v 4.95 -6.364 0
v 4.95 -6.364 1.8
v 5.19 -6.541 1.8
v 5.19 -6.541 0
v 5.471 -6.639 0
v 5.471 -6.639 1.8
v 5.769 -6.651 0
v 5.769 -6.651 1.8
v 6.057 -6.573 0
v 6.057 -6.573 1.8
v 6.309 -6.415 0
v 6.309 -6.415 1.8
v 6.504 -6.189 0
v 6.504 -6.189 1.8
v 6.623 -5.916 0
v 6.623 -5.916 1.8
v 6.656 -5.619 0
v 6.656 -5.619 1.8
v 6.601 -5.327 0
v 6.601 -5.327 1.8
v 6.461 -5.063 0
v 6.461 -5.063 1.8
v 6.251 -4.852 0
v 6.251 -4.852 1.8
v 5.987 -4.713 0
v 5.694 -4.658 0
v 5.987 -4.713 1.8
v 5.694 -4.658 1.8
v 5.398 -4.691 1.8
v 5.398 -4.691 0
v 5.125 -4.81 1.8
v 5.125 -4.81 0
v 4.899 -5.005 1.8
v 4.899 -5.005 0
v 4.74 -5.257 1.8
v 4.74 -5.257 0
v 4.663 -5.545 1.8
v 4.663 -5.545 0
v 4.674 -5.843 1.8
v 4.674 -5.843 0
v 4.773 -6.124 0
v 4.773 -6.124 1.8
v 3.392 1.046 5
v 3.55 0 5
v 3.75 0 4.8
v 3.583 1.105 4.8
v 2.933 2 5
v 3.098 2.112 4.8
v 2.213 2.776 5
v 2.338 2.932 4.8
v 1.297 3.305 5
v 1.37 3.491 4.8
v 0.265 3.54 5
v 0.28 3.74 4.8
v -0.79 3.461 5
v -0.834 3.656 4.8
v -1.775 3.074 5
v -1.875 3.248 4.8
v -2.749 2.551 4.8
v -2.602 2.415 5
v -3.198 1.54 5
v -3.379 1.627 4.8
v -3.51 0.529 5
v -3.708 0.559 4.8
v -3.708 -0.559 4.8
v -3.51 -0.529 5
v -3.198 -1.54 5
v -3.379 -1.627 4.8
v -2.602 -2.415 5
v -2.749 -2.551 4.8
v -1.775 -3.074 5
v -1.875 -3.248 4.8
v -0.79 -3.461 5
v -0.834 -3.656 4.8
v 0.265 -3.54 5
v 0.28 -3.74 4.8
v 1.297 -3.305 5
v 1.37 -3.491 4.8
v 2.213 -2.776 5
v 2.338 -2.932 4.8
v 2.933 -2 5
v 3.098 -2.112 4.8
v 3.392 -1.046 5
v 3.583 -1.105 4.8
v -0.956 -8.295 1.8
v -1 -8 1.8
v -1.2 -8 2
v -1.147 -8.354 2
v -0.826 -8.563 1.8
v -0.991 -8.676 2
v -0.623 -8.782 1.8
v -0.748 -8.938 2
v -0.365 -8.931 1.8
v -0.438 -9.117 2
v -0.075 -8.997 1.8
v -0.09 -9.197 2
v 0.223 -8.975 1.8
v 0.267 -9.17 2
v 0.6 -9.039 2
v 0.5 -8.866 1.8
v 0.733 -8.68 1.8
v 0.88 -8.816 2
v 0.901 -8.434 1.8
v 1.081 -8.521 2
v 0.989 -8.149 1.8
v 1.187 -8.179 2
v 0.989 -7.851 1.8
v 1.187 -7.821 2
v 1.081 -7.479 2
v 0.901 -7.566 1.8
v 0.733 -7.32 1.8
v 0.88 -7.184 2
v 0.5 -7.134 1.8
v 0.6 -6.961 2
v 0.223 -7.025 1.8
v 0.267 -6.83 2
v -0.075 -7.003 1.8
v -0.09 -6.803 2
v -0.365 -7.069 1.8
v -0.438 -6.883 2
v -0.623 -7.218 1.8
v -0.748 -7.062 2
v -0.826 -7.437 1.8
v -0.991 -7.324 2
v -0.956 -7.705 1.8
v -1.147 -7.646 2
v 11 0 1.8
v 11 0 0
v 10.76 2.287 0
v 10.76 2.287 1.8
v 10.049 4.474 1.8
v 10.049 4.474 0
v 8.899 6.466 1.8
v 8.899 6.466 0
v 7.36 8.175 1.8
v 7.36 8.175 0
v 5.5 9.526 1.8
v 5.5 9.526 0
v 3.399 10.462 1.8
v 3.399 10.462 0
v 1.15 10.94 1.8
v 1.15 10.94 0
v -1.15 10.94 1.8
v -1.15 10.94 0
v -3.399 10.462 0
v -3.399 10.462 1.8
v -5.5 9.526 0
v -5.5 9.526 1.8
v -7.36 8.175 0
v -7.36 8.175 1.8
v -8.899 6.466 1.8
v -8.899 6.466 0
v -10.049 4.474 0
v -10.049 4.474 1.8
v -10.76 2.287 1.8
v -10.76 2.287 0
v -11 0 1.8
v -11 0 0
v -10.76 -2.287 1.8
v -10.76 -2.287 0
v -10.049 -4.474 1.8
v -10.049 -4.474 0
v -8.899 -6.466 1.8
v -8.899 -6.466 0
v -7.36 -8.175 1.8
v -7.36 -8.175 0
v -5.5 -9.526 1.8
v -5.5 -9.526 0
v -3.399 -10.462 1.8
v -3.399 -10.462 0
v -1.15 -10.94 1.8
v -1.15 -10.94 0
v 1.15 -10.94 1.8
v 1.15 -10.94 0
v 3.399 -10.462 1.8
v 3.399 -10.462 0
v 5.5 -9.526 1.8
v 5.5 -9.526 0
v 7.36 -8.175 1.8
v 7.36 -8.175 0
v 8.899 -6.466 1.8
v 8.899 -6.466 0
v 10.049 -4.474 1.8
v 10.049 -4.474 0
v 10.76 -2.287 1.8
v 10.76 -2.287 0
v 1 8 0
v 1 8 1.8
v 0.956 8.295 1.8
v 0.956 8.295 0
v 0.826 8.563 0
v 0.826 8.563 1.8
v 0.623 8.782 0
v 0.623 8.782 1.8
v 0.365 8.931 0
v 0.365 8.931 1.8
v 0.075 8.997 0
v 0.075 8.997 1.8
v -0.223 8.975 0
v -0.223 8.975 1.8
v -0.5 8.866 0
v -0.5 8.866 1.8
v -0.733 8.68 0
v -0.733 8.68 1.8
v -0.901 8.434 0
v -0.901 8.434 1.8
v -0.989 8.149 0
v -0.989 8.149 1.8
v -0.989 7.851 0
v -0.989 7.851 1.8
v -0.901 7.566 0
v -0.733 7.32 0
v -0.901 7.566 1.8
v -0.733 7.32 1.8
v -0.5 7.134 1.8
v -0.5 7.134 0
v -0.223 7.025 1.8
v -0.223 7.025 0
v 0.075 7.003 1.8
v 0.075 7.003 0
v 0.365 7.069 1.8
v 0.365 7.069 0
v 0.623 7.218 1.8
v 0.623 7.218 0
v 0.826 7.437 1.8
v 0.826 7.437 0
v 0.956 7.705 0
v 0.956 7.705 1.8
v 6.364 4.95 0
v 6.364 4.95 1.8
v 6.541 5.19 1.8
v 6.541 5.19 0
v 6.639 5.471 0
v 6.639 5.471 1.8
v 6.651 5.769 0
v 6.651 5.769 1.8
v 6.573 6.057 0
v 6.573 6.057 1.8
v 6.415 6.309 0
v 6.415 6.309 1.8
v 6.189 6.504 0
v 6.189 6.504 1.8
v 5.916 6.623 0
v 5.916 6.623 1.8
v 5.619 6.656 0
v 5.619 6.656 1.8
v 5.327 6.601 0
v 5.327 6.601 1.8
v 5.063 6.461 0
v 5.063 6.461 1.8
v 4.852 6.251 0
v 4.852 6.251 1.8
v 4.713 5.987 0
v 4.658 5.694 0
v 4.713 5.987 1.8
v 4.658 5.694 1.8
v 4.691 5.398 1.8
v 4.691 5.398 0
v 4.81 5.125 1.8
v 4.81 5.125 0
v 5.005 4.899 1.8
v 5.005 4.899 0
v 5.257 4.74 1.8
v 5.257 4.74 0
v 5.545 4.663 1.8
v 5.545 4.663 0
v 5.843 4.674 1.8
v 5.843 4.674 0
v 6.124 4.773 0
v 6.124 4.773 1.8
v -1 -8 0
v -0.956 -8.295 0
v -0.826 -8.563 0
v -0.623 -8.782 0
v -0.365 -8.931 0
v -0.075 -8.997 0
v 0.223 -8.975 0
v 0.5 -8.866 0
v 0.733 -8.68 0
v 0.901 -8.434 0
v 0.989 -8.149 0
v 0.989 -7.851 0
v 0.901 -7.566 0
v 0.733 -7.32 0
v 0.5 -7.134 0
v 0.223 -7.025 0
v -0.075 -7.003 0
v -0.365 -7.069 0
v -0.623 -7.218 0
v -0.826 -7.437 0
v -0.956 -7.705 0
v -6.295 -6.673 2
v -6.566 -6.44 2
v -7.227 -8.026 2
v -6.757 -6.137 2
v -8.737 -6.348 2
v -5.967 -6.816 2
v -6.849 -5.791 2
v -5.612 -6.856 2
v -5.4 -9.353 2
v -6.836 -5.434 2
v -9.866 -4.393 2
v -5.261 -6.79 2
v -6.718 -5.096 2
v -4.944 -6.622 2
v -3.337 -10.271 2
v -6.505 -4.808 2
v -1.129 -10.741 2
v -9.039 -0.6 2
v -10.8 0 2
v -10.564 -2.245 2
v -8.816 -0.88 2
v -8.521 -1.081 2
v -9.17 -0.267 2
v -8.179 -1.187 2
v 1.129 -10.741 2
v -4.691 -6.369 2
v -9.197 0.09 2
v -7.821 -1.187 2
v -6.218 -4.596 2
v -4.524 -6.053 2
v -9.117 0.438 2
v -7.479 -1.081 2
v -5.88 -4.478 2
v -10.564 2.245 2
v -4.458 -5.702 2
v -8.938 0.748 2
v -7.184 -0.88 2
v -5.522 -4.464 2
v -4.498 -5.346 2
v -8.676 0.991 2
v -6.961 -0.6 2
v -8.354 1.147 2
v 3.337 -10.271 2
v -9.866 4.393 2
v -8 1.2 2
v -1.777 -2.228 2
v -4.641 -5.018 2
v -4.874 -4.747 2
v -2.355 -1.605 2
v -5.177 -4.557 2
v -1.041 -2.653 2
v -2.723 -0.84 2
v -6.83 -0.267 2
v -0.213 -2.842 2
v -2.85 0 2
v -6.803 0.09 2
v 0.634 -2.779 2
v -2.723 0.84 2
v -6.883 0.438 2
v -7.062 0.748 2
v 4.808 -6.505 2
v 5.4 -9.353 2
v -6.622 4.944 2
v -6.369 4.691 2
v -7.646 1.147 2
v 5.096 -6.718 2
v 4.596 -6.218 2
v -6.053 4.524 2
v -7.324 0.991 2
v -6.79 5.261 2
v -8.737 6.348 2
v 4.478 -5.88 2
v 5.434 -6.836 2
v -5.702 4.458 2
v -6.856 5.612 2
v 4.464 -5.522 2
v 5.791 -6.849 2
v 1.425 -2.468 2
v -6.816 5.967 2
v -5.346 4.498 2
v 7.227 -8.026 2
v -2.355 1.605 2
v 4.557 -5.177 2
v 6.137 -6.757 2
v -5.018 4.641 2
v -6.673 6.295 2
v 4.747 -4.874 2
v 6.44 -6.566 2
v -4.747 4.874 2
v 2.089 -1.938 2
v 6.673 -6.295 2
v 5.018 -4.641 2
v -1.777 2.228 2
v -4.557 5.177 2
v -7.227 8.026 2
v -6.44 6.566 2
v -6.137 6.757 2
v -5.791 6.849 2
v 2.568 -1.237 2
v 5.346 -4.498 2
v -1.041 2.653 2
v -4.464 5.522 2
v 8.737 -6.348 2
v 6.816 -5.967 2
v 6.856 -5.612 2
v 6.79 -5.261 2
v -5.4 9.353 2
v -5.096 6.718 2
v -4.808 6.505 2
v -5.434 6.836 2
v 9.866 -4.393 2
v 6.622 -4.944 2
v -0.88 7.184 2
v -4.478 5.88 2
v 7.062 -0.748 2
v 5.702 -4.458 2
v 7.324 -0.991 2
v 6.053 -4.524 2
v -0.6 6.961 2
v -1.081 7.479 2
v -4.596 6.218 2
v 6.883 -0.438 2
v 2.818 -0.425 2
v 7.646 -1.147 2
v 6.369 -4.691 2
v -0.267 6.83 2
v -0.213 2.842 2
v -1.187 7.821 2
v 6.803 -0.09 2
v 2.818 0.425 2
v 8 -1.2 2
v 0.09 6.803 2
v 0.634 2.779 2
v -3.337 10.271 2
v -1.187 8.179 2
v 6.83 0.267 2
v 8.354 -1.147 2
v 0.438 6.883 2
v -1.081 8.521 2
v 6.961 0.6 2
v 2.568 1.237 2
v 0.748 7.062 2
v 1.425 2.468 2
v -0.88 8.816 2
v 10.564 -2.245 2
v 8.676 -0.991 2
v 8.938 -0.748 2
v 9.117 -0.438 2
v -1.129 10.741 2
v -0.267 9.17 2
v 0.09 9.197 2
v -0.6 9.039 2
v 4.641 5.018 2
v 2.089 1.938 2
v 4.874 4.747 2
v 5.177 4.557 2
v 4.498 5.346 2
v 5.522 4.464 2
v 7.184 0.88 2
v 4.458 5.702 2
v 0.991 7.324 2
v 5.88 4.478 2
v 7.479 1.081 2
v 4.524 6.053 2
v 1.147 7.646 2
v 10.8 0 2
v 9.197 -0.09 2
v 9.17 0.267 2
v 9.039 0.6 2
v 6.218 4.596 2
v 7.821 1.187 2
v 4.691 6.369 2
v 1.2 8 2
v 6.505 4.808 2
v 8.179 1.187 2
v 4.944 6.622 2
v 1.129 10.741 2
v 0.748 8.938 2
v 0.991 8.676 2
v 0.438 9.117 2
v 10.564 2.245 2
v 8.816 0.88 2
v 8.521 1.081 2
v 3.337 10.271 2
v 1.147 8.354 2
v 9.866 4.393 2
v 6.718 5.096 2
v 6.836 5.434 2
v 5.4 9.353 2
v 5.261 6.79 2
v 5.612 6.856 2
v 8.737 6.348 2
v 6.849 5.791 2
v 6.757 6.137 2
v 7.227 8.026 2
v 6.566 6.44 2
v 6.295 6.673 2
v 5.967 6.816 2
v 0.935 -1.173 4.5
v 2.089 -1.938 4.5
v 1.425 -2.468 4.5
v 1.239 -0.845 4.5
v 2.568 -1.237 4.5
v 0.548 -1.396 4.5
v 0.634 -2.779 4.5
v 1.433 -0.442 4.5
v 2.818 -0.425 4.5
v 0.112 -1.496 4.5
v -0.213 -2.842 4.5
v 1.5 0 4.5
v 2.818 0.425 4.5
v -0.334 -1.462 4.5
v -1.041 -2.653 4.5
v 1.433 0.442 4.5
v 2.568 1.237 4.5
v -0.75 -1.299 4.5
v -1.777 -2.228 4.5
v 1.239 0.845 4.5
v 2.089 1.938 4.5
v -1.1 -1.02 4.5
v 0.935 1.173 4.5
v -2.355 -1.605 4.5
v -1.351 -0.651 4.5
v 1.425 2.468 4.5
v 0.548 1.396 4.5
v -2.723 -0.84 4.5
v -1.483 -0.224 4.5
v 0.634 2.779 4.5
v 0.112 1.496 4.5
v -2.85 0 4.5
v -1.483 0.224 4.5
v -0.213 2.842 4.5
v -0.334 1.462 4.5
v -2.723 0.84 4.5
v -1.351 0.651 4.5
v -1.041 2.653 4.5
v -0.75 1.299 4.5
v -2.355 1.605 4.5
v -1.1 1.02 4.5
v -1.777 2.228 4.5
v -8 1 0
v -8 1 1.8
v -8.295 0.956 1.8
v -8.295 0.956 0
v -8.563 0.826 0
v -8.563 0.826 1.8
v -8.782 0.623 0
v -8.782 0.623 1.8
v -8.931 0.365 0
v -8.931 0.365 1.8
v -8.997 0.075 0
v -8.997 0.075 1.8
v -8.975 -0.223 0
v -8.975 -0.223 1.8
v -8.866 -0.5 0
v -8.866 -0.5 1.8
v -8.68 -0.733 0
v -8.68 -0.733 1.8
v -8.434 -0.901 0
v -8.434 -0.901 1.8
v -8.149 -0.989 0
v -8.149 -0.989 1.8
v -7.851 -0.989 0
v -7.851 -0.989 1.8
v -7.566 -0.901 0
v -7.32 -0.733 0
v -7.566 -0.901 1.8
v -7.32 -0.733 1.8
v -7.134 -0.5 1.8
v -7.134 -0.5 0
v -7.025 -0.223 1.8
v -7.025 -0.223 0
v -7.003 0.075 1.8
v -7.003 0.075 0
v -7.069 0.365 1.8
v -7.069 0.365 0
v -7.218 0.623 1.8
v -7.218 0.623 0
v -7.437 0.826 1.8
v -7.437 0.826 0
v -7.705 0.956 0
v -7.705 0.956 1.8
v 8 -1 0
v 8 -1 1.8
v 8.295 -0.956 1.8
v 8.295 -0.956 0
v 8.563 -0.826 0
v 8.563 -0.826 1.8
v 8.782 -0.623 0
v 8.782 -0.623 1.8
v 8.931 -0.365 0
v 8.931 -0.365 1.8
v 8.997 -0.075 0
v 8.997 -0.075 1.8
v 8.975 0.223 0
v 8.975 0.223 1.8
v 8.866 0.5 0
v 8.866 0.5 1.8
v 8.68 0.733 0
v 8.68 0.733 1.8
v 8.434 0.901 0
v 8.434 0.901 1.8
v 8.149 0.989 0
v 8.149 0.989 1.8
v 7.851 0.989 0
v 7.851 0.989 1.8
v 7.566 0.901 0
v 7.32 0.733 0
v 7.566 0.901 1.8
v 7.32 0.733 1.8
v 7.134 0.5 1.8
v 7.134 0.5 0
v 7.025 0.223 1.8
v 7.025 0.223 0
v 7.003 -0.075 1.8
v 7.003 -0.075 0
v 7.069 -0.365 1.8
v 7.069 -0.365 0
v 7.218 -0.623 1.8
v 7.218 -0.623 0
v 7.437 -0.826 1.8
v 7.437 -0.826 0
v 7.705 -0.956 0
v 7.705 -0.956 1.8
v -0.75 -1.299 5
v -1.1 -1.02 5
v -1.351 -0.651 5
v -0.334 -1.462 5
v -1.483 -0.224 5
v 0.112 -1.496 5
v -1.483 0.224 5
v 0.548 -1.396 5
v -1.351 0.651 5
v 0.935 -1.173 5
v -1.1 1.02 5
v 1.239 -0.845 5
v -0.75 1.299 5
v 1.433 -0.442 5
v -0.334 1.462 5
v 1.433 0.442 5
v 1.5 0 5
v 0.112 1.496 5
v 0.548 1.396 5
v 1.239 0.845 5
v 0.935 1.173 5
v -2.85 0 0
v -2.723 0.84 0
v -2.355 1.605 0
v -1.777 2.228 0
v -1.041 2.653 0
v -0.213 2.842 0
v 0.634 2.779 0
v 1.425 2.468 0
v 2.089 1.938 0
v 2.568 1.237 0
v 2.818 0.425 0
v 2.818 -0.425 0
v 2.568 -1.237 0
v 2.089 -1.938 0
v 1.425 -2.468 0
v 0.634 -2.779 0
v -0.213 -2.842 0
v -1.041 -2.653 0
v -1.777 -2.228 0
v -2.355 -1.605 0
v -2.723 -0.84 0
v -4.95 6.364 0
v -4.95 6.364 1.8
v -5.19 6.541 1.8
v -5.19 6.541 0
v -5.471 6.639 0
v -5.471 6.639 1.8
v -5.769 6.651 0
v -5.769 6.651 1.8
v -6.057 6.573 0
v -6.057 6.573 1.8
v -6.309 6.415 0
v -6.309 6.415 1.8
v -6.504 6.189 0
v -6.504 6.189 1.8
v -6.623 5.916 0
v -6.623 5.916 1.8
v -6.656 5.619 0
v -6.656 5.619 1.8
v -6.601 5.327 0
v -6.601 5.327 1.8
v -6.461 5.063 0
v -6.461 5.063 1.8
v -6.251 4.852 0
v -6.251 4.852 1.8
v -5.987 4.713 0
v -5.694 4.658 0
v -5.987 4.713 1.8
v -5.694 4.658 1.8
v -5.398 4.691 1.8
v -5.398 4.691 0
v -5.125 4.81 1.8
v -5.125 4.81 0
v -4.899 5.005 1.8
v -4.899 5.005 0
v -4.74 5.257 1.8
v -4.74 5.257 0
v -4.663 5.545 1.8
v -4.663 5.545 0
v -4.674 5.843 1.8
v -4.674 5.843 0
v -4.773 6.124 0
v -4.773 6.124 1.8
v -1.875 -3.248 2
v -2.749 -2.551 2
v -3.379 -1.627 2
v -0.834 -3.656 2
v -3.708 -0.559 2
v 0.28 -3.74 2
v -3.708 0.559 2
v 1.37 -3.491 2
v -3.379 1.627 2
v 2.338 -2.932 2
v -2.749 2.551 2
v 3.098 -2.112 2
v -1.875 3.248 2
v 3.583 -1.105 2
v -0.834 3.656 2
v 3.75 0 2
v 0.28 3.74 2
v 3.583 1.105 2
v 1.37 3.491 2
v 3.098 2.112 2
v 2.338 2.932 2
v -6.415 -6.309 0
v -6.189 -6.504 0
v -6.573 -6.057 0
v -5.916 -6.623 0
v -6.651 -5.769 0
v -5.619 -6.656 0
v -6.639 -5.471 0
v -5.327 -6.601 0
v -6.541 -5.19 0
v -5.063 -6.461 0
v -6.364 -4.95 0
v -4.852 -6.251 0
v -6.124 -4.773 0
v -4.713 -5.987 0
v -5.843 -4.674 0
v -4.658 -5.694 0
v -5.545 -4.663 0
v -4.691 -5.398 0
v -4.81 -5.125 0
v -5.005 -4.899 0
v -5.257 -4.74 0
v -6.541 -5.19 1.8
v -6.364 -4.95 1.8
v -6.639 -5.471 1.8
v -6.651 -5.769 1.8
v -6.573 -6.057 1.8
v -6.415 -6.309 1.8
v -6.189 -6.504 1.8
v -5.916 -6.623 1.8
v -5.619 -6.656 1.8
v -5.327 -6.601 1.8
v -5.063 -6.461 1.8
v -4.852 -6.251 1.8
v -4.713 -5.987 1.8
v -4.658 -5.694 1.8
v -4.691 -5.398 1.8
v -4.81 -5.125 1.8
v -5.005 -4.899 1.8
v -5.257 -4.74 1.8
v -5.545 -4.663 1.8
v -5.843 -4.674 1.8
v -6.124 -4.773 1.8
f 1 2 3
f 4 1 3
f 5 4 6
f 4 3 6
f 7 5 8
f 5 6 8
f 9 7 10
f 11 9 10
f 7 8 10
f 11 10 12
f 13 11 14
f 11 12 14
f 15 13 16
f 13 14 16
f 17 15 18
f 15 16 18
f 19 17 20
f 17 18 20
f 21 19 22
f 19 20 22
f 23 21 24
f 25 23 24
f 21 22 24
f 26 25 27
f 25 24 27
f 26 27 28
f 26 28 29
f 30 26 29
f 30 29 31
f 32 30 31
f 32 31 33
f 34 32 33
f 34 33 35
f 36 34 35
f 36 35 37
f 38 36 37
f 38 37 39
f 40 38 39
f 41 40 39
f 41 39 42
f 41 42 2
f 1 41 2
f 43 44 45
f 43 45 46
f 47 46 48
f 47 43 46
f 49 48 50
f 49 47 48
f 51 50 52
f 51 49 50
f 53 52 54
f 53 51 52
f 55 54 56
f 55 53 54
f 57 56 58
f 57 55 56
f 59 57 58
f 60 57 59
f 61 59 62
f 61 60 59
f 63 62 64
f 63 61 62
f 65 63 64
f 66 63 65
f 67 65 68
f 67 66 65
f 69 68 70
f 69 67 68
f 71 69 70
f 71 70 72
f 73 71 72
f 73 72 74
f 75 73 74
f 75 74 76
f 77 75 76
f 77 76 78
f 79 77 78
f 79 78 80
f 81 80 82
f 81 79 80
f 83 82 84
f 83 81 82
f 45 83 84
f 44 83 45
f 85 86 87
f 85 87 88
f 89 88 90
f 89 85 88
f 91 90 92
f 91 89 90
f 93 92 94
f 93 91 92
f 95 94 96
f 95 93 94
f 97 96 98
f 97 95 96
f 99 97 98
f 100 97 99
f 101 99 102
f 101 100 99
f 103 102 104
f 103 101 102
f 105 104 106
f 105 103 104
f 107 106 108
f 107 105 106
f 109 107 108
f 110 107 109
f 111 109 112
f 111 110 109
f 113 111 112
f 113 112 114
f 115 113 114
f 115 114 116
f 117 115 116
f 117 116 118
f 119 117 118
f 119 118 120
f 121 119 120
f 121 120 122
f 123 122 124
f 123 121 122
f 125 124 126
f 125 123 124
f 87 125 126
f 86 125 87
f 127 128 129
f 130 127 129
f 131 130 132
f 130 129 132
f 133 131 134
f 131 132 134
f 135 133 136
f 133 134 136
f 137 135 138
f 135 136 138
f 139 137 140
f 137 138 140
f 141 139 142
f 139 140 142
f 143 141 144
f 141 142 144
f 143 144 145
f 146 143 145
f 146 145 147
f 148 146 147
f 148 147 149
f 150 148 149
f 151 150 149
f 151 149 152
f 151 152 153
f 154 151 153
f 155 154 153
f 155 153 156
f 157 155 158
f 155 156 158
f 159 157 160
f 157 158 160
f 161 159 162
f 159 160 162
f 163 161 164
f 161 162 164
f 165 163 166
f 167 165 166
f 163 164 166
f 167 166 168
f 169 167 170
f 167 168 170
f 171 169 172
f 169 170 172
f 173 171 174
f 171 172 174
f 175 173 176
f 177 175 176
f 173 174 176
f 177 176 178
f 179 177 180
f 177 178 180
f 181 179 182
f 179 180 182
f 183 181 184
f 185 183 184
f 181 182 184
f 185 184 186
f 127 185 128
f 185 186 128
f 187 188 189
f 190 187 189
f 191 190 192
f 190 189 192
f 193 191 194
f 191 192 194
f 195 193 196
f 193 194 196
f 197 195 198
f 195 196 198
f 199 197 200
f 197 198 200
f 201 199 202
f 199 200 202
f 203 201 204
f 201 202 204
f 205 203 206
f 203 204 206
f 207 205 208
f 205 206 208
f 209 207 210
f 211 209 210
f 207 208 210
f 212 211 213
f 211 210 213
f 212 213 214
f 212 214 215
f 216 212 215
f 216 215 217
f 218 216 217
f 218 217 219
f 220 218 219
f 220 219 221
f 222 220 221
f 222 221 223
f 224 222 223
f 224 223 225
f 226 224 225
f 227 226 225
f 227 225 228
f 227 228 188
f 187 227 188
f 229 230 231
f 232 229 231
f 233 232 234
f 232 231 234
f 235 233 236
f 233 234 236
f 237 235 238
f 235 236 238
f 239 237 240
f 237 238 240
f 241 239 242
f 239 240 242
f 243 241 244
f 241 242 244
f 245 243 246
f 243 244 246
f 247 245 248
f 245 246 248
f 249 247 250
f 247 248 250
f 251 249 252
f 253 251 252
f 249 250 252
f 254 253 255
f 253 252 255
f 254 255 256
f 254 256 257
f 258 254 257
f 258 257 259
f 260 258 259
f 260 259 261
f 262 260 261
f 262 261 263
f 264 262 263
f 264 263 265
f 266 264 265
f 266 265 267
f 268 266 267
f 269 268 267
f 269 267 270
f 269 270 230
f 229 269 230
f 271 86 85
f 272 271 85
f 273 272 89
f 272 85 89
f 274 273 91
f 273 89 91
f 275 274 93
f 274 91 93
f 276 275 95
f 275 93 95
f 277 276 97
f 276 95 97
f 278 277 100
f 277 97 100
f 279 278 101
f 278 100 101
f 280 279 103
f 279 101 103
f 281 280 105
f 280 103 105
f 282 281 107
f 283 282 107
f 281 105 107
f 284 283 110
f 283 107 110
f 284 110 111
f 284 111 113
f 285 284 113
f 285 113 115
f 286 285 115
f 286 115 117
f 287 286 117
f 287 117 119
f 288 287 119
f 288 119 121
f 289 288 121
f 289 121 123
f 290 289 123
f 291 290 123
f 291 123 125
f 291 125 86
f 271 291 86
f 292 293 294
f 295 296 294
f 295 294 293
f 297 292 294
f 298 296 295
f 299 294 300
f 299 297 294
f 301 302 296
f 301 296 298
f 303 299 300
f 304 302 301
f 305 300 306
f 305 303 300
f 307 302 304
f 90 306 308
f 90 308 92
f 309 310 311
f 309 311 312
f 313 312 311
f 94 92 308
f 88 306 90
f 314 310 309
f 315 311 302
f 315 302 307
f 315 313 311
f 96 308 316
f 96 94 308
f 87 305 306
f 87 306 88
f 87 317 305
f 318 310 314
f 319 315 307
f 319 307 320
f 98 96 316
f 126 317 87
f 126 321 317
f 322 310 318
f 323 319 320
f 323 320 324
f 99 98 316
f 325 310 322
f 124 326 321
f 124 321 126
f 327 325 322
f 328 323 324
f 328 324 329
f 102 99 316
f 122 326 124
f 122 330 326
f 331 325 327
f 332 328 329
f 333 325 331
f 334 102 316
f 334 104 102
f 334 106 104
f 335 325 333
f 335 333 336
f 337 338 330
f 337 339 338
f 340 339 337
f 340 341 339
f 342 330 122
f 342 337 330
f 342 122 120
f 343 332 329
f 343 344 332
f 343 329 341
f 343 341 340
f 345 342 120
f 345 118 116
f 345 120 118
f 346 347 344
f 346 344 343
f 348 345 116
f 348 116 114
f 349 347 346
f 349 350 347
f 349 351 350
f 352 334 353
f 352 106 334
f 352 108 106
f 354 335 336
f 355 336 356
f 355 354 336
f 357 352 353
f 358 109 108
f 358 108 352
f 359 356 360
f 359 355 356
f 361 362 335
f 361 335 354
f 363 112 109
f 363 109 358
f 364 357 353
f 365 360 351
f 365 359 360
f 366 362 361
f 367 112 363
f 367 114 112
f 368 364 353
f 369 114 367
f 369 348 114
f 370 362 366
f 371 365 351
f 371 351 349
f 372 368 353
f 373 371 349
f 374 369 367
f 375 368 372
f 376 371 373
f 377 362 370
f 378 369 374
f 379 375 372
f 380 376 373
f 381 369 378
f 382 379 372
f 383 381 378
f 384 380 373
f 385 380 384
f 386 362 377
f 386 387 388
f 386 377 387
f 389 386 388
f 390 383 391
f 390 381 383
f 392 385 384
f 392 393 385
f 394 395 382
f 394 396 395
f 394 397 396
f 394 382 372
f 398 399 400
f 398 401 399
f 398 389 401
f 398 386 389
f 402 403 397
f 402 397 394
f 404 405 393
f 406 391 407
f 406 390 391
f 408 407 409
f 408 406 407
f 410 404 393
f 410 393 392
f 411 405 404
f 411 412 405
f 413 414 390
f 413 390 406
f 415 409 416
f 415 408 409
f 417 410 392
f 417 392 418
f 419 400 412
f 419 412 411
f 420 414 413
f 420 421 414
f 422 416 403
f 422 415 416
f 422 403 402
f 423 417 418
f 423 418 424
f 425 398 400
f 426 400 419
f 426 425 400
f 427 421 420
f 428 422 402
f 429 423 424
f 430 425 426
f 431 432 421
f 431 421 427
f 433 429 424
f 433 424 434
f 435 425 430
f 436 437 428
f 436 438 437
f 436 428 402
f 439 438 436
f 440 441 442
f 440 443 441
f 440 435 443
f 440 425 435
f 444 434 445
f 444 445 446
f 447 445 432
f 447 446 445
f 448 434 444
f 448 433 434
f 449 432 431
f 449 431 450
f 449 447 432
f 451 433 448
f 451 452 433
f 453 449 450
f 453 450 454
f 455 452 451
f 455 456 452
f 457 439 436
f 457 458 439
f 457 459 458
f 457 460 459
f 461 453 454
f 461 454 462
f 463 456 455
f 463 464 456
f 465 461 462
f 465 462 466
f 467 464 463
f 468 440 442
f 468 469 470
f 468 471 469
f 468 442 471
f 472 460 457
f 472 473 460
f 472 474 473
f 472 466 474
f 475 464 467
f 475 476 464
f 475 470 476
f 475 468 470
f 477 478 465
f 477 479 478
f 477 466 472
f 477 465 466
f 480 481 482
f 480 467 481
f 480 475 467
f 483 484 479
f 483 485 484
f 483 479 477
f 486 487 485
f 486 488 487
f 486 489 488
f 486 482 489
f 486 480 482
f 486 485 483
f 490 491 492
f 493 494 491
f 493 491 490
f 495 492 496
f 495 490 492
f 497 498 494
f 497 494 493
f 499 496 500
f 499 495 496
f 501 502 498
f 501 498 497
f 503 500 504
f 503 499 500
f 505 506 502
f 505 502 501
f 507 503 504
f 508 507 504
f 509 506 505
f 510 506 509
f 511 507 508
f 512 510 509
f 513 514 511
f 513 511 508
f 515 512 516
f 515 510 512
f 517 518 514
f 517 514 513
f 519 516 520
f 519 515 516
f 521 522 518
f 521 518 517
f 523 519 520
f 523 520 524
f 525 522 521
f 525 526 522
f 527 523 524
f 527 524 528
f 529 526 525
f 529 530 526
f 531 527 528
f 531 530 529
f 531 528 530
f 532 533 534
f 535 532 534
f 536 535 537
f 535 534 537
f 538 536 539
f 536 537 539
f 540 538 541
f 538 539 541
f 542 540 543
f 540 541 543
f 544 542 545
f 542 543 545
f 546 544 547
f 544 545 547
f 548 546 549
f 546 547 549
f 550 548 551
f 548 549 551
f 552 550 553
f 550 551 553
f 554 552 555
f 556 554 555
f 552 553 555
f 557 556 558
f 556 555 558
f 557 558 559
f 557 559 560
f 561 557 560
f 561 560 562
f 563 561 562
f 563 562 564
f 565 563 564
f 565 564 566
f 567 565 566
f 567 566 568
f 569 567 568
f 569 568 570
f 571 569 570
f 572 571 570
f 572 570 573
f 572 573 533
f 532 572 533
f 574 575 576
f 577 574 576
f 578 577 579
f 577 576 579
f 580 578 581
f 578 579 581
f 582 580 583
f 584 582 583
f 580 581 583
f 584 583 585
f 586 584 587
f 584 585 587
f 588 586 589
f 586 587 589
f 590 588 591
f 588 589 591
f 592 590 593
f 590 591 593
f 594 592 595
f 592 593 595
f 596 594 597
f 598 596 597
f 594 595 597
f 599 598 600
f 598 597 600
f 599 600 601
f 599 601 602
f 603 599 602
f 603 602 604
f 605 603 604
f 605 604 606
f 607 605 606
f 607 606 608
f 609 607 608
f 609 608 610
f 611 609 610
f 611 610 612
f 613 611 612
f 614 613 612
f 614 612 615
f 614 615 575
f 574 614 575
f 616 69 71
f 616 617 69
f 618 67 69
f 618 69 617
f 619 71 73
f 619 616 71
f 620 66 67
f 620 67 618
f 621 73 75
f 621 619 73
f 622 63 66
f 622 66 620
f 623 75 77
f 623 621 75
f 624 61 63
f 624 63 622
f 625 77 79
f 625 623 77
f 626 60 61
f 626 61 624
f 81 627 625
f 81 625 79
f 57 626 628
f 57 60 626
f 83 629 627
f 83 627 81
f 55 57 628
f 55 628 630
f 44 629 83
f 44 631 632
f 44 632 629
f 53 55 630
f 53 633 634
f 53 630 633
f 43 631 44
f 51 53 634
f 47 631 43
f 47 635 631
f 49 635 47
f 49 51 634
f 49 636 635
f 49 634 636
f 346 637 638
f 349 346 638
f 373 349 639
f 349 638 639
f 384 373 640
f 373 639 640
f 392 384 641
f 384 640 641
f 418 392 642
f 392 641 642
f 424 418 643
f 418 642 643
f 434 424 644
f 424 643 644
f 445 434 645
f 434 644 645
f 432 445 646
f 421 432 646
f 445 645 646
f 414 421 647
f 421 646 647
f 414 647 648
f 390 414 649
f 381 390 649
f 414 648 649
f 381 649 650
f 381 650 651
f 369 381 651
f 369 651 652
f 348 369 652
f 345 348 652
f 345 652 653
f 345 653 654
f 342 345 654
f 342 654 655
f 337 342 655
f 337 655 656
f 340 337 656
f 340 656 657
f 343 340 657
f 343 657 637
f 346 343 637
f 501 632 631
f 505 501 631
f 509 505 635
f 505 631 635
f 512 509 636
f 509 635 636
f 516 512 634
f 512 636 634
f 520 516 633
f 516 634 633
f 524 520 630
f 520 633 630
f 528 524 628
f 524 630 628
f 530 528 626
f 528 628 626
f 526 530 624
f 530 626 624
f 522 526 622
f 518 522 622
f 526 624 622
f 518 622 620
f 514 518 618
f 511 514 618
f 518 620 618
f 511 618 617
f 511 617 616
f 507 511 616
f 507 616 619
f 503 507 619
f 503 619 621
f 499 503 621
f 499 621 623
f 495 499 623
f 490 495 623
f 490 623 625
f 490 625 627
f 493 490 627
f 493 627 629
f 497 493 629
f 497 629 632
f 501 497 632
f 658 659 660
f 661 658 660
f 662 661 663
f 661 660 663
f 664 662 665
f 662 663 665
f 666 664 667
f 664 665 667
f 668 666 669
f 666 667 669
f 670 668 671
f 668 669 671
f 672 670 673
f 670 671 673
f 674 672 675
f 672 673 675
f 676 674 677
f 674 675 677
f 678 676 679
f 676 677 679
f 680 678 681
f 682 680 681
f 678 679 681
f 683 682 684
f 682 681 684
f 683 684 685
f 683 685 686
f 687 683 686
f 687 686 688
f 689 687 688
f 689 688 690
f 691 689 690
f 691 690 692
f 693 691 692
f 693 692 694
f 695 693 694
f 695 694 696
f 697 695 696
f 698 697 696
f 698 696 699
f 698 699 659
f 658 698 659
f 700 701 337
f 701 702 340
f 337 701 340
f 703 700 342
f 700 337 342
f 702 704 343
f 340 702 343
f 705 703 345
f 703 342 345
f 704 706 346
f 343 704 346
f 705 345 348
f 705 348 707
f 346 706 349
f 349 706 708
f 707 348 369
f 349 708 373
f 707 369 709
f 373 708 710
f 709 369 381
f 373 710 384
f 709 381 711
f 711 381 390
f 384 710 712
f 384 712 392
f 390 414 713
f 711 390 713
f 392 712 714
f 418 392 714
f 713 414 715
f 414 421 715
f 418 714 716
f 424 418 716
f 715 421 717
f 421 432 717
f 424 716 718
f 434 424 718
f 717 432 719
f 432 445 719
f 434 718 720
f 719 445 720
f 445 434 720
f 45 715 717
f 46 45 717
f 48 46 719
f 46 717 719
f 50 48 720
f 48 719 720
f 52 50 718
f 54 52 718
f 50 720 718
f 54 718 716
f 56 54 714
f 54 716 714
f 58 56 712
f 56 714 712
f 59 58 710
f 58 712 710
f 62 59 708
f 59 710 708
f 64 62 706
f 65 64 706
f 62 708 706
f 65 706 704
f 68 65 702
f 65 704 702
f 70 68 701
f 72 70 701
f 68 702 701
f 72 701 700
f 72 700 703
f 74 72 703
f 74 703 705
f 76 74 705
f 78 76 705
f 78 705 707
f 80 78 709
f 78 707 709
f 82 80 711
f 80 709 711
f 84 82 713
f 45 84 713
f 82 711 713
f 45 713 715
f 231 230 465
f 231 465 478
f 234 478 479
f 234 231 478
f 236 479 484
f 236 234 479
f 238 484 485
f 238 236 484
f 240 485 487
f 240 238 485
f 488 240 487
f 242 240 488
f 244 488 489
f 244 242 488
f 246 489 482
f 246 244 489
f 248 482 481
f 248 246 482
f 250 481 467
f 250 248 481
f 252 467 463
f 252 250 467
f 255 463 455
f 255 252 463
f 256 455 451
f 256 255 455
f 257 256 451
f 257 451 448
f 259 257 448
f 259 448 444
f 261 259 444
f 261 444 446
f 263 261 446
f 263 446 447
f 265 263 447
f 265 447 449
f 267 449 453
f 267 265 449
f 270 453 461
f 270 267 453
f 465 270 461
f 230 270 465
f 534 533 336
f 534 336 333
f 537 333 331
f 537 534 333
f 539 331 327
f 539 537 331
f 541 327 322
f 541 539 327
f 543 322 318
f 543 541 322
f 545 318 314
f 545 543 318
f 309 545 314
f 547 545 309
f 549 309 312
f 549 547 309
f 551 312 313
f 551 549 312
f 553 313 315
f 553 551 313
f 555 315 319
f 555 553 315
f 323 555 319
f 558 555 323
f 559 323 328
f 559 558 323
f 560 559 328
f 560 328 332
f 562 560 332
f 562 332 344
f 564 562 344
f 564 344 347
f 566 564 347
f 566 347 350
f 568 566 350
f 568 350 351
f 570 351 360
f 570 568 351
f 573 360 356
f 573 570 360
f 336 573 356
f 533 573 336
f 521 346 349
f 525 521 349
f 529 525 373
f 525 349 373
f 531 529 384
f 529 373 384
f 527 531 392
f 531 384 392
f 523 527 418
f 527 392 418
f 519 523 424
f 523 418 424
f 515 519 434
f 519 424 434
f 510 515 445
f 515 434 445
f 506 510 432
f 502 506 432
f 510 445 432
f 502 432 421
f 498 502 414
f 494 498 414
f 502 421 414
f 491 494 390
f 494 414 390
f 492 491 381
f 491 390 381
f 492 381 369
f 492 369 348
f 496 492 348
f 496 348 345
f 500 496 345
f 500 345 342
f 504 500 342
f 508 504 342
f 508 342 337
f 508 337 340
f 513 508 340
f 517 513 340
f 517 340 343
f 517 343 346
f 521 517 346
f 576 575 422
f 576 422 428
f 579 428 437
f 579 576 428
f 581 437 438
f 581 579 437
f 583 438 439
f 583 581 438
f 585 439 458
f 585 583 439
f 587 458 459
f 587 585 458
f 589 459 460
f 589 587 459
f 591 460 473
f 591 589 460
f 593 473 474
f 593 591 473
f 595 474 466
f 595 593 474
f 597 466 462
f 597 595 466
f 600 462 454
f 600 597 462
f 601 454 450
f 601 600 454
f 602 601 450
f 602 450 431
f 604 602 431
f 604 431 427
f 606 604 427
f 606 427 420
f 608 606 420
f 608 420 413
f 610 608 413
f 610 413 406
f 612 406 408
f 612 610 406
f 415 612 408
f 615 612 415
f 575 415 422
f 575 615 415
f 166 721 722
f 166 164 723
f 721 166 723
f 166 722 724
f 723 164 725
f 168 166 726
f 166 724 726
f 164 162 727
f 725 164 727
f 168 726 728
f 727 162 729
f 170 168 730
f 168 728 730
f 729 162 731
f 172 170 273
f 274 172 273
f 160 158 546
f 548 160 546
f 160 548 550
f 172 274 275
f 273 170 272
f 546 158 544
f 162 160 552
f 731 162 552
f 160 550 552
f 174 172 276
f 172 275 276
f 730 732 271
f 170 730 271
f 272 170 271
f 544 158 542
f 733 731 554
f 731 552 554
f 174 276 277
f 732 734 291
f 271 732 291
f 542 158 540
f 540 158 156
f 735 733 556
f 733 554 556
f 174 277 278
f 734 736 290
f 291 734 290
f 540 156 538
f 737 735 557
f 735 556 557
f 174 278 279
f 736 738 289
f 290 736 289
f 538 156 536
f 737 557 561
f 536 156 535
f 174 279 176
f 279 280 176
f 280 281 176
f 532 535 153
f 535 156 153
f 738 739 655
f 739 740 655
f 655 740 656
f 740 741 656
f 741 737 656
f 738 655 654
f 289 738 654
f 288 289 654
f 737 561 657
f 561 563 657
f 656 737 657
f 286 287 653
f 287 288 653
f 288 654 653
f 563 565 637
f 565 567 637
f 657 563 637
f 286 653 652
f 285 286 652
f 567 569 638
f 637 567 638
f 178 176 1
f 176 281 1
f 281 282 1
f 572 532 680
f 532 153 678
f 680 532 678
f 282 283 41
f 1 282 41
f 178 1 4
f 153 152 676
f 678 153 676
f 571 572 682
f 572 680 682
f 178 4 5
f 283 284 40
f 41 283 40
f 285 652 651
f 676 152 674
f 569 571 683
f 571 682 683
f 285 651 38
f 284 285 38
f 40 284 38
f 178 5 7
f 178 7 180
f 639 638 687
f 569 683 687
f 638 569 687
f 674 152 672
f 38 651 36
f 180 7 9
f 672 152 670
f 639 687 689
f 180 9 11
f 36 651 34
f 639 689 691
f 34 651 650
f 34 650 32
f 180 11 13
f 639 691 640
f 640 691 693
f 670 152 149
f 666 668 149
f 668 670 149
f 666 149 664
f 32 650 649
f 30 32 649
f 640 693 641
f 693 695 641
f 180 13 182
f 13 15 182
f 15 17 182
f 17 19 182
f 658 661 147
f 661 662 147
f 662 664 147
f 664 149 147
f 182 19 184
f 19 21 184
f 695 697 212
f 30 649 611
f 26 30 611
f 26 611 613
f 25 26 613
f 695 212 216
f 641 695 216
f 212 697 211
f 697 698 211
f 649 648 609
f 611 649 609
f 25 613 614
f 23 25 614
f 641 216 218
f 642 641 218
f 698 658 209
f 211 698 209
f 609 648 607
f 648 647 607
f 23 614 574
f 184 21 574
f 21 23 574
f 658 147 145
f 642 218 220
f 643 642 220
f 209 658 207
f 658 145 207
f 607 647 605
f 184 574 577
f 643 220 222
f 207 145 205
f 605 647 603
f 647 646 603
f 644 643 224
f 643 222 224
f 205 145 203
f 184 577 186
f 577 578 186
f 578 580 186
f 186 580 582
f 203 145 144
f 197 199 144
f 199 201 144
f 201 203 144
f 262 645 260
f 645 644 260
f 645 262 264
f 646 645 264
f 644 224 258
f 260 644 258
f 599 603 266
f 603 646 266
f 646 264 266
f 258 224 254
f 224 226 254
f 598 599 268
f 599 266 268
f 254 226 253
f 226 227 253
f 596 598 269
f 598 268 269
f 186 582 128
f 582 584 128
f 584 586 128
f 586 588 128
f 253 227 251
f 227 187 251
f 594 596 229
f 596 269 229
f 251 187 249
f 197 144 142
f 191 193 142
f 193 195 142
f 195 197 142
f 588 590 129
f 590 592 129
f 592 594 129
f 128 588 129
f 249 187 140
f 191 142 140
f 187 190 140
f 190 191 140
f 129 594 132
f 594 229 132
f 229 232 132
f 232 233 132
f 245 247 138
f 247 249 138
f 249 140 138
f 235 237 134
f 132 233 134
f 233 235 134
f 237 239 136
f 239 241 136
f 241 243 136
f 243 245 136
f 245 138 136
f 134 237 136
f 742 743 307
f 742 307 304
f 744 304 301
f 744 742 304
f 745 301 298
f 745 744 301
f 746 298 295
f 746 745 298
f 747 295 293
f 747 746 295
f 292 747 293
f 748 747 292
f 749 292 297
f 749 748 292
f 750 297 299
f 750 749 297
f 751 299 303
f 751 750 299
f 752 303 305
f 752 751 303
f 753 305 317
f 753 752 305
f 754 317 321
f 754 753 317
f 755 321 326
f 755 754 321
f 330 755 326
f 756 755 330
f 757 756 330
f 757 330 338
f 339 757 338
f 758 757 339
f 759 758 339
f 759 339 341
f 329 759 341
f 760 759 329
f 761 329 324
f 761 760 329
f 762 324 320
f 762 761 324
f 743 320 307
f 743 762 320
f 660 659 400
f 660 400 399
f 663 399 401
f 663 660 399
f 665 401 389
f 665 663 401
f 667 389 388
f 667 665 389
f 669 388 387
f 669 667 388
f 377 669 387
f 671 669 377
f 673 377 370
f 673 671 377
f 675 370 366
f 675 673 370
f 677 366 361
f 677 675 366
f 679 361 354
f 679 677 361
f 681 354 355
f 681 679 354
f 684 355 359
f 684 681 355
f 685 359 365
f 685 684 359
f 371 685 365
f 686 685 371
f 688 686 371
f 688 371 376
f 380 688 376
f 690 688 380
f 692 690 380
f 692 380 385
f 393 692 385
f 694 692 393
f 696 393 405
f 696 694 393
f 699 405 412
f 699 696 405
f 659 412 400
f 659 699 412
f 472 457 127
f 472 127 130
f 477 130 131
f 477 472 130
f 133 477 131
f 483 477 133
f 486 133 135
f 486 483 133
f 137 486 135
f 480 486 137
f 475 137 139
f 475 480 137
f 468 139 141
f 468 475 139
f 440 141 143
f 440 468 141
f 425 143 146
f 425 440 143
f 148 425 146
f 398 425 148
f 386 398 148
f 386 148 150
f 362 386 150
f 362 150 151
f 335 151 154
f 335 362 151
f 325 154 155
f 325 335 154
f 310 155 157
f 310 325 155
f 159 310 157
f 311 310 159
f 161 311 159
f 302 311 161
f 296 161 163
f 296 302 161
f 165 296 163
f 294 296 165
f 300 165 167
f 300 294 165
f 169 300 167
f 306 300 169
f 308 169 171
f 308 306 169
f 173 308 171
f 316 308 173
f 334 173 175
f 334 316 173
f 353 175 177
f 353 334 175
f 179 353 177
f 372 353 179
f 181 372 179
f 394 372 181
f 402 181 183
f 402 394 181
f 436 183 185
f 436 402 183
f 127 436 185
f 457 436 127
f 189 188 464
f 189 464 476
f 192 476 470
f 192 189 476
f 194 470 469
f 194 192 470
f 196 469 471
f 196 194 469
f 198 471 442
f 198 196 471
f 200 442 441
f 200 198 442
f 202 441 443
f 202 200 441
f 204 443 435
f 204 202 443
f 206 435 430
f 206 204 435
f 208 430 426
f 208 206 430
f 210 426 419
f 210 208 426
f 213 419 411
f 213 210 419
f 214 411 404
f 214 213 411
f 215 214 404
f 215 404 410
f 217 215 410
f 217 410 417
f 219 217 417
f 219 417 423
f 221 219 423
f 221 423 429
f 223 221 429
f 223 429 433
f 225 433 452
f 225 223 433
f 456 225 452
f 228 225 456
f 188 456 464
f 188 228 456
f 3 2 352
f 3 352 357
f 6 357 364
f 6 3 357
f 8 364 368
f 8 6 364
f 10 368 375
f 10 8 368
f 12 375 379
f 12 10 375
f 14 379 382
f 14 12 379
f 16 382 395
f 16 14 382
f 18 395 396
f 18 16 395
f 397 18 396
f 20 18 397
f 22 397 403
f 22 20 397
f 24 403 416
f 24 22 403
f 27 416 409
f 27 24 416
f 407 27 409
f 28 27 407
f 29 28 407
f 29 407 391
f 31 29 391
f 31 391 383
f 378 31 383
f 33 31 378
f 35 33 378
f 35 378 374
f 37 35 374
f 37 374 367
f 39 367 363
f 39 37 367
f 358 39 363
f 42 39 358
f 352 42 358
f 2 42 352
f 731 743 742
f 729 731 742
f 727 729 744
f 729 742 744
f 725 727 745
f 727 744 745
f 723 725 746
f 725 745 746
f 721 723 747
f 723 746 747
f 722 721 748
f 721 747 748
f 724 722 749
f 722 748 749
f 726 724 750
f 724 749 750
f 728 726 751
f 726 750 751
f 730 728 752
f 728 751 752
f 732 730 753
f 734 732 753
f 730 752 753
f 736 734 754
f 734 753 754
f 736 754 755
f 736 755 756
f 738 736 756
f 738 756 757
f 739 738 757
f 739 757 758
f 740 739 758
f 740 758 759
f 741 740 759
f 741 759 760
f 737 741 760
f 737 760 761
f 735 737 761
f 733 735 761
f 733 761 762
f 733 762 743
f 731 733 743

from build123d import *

# Parameters (mm, degrees)
SKETCH1_R           = 11
BOSS_EXTRUDE2_DEPTH = 2
SKETCH2_R           = 3.75
BOSS_EXTRUDE3_DEPTH = 3
SKETCH3_R           = 2.85
CUT_EXTRUDE1_DEPTH  = 4.5
SKETCH4_R           = 1.5
CUT_EXTRUDE2_DEPTH  = 17.340134638
SKETCH6_R           = 1
CUT_EXTRUDE3_DEPTH  = 16.842979518
CIRPATTERN1_COUNT   = 8
CHAMFER1_SIZE       = 0.2
CHAMFER2_SIZE       = 0.2
CHAMFER3_SIZE       = 0.2
CHAMFER4_SIZE       = 0.2
CHAMFER5_SIZE       = 0.2


with BuildPart() as part:
    # Sketch1 → Boss-Extrude2 (new body)
    with BuildSketch(Plane.XY):
        Circle(SKETCH1_R)
    extrude(amount=BOSS_EXTRUDE2_DEPTH)


with BuildPart() as body_2:
    # Sketch2 → Boss-Extrude3 (new body)
    with BuildSketch(Plane.XY.offset(2)):
        Circle(SKETCH2_R)
    extrude(amount=BOSS_EXTRUDE3_DEPTH)


with BuildPart() as cut_extrude1_tool:
    # Sketch3 → Cut-Extrude1 (new body)
    with BuildSketch(Plane(origin=(0, 0, 0), x_dir=(-1, 0, 0), z_dir=(0, 0, -1))):
        Circle(SKETCH3_R)
    extrude(amount=-CUT_EXTRUDE1_DEPTH)


with BuildPart() as part_1:
    add(part.part)

    # Cut-Extrude1: cut by cut_extrude1_tool
    add(cut_extrude1_tool.part, mode=Mode.SUBTRACT)

    # Sketch6 → Cut-Extrude3 (cut, through all)
    with BuildSketch(Plane.XY.offset(2)):
        with Locations((0, 8)):
            Circle(SKETCH6_R)
    cut_extrude3 = extrude(amount=-CUT_EXTRUDE3_DEPTH, mode=Mode.SUBTRACT)

    # CirPattern1: Cut-Extrude3 ×8 about axis
    cirpattern1_axis = Axis((0, 0, 0), (0, 0, 1))
    for i in range(1, CIRPATTERN1_COUNT):
        add(cut_extrude3.rotate(cirpattern1_axis, i * 360 / CIRPATTERN1_COUNT), mode=Mode.SUBTRACT)

    # Chamfer1
    chamfer1_edges = [part_1.edges().sort_by_distance(p)[0] for p in [
        (-11, 0, 2),
    ]]
    chamfer(chamfer1_edges, length=CHAMFER1_SIZE)

    # Chamfer3
    chamfer3_edges = [part_1.edges().sort_by_distance(p)[0] for p in [
        (-1, 8, 2),
    ]]
    chamfer(chamfer3_edges, length=CHAMFER3_SIZE)

    # Chamfer4
    chamfer4_edges = [part_1.edges().sort_by_distance(p)[0] for p in [
        (8, 1, 2),
        (4.949747468, 6.363961031, 2),
    ]]
    chamfer(chamfer4_edges, length=CHAMFER4_SIZE)

    # Chamfer5
    chamfer5_edges = [part_1.edges().sort_by_distance(p)[0] for p in [
        (-6.363961031, 4.949747468, 2),
        (-8, -1, 2),
        (-4.949747468, -6.363961031, 2),
        (1, -8, 2),
        (6.363961031, -4.949747468, 2),
    ]]
    chamfer(chamfer5_edges, length=CHAMFER5_SIZE)


with BuildPart() as body_2_1:
    add(body_2.part)

    # Cut-Extrude1: cut by cut_extrude1_tool
    add(cut_extrude1_tool.part, mode=Mode.SUBTRACT)

    # Sketch4 → Cut-Extrude2 (cut, through all)
    with BuildSketch(Plane.XY.offset(5)):
        Circle(SKETCH4_R)
    extrude(amount=-CUT_EXTRUDE2_DEPTH, mode=Mode.SUBTRACT)

    # Chamfer2
    chamfer2_edges = [body_2_1.edges().sort_by_distance(p)[0] for p in [
        (-3.75, 0, 5),
    ]]
    chamfer(chamfer2_edges, length=CHAMFER2_SIZE)


solid = Compound([part_1.part, body_2_1.part])
